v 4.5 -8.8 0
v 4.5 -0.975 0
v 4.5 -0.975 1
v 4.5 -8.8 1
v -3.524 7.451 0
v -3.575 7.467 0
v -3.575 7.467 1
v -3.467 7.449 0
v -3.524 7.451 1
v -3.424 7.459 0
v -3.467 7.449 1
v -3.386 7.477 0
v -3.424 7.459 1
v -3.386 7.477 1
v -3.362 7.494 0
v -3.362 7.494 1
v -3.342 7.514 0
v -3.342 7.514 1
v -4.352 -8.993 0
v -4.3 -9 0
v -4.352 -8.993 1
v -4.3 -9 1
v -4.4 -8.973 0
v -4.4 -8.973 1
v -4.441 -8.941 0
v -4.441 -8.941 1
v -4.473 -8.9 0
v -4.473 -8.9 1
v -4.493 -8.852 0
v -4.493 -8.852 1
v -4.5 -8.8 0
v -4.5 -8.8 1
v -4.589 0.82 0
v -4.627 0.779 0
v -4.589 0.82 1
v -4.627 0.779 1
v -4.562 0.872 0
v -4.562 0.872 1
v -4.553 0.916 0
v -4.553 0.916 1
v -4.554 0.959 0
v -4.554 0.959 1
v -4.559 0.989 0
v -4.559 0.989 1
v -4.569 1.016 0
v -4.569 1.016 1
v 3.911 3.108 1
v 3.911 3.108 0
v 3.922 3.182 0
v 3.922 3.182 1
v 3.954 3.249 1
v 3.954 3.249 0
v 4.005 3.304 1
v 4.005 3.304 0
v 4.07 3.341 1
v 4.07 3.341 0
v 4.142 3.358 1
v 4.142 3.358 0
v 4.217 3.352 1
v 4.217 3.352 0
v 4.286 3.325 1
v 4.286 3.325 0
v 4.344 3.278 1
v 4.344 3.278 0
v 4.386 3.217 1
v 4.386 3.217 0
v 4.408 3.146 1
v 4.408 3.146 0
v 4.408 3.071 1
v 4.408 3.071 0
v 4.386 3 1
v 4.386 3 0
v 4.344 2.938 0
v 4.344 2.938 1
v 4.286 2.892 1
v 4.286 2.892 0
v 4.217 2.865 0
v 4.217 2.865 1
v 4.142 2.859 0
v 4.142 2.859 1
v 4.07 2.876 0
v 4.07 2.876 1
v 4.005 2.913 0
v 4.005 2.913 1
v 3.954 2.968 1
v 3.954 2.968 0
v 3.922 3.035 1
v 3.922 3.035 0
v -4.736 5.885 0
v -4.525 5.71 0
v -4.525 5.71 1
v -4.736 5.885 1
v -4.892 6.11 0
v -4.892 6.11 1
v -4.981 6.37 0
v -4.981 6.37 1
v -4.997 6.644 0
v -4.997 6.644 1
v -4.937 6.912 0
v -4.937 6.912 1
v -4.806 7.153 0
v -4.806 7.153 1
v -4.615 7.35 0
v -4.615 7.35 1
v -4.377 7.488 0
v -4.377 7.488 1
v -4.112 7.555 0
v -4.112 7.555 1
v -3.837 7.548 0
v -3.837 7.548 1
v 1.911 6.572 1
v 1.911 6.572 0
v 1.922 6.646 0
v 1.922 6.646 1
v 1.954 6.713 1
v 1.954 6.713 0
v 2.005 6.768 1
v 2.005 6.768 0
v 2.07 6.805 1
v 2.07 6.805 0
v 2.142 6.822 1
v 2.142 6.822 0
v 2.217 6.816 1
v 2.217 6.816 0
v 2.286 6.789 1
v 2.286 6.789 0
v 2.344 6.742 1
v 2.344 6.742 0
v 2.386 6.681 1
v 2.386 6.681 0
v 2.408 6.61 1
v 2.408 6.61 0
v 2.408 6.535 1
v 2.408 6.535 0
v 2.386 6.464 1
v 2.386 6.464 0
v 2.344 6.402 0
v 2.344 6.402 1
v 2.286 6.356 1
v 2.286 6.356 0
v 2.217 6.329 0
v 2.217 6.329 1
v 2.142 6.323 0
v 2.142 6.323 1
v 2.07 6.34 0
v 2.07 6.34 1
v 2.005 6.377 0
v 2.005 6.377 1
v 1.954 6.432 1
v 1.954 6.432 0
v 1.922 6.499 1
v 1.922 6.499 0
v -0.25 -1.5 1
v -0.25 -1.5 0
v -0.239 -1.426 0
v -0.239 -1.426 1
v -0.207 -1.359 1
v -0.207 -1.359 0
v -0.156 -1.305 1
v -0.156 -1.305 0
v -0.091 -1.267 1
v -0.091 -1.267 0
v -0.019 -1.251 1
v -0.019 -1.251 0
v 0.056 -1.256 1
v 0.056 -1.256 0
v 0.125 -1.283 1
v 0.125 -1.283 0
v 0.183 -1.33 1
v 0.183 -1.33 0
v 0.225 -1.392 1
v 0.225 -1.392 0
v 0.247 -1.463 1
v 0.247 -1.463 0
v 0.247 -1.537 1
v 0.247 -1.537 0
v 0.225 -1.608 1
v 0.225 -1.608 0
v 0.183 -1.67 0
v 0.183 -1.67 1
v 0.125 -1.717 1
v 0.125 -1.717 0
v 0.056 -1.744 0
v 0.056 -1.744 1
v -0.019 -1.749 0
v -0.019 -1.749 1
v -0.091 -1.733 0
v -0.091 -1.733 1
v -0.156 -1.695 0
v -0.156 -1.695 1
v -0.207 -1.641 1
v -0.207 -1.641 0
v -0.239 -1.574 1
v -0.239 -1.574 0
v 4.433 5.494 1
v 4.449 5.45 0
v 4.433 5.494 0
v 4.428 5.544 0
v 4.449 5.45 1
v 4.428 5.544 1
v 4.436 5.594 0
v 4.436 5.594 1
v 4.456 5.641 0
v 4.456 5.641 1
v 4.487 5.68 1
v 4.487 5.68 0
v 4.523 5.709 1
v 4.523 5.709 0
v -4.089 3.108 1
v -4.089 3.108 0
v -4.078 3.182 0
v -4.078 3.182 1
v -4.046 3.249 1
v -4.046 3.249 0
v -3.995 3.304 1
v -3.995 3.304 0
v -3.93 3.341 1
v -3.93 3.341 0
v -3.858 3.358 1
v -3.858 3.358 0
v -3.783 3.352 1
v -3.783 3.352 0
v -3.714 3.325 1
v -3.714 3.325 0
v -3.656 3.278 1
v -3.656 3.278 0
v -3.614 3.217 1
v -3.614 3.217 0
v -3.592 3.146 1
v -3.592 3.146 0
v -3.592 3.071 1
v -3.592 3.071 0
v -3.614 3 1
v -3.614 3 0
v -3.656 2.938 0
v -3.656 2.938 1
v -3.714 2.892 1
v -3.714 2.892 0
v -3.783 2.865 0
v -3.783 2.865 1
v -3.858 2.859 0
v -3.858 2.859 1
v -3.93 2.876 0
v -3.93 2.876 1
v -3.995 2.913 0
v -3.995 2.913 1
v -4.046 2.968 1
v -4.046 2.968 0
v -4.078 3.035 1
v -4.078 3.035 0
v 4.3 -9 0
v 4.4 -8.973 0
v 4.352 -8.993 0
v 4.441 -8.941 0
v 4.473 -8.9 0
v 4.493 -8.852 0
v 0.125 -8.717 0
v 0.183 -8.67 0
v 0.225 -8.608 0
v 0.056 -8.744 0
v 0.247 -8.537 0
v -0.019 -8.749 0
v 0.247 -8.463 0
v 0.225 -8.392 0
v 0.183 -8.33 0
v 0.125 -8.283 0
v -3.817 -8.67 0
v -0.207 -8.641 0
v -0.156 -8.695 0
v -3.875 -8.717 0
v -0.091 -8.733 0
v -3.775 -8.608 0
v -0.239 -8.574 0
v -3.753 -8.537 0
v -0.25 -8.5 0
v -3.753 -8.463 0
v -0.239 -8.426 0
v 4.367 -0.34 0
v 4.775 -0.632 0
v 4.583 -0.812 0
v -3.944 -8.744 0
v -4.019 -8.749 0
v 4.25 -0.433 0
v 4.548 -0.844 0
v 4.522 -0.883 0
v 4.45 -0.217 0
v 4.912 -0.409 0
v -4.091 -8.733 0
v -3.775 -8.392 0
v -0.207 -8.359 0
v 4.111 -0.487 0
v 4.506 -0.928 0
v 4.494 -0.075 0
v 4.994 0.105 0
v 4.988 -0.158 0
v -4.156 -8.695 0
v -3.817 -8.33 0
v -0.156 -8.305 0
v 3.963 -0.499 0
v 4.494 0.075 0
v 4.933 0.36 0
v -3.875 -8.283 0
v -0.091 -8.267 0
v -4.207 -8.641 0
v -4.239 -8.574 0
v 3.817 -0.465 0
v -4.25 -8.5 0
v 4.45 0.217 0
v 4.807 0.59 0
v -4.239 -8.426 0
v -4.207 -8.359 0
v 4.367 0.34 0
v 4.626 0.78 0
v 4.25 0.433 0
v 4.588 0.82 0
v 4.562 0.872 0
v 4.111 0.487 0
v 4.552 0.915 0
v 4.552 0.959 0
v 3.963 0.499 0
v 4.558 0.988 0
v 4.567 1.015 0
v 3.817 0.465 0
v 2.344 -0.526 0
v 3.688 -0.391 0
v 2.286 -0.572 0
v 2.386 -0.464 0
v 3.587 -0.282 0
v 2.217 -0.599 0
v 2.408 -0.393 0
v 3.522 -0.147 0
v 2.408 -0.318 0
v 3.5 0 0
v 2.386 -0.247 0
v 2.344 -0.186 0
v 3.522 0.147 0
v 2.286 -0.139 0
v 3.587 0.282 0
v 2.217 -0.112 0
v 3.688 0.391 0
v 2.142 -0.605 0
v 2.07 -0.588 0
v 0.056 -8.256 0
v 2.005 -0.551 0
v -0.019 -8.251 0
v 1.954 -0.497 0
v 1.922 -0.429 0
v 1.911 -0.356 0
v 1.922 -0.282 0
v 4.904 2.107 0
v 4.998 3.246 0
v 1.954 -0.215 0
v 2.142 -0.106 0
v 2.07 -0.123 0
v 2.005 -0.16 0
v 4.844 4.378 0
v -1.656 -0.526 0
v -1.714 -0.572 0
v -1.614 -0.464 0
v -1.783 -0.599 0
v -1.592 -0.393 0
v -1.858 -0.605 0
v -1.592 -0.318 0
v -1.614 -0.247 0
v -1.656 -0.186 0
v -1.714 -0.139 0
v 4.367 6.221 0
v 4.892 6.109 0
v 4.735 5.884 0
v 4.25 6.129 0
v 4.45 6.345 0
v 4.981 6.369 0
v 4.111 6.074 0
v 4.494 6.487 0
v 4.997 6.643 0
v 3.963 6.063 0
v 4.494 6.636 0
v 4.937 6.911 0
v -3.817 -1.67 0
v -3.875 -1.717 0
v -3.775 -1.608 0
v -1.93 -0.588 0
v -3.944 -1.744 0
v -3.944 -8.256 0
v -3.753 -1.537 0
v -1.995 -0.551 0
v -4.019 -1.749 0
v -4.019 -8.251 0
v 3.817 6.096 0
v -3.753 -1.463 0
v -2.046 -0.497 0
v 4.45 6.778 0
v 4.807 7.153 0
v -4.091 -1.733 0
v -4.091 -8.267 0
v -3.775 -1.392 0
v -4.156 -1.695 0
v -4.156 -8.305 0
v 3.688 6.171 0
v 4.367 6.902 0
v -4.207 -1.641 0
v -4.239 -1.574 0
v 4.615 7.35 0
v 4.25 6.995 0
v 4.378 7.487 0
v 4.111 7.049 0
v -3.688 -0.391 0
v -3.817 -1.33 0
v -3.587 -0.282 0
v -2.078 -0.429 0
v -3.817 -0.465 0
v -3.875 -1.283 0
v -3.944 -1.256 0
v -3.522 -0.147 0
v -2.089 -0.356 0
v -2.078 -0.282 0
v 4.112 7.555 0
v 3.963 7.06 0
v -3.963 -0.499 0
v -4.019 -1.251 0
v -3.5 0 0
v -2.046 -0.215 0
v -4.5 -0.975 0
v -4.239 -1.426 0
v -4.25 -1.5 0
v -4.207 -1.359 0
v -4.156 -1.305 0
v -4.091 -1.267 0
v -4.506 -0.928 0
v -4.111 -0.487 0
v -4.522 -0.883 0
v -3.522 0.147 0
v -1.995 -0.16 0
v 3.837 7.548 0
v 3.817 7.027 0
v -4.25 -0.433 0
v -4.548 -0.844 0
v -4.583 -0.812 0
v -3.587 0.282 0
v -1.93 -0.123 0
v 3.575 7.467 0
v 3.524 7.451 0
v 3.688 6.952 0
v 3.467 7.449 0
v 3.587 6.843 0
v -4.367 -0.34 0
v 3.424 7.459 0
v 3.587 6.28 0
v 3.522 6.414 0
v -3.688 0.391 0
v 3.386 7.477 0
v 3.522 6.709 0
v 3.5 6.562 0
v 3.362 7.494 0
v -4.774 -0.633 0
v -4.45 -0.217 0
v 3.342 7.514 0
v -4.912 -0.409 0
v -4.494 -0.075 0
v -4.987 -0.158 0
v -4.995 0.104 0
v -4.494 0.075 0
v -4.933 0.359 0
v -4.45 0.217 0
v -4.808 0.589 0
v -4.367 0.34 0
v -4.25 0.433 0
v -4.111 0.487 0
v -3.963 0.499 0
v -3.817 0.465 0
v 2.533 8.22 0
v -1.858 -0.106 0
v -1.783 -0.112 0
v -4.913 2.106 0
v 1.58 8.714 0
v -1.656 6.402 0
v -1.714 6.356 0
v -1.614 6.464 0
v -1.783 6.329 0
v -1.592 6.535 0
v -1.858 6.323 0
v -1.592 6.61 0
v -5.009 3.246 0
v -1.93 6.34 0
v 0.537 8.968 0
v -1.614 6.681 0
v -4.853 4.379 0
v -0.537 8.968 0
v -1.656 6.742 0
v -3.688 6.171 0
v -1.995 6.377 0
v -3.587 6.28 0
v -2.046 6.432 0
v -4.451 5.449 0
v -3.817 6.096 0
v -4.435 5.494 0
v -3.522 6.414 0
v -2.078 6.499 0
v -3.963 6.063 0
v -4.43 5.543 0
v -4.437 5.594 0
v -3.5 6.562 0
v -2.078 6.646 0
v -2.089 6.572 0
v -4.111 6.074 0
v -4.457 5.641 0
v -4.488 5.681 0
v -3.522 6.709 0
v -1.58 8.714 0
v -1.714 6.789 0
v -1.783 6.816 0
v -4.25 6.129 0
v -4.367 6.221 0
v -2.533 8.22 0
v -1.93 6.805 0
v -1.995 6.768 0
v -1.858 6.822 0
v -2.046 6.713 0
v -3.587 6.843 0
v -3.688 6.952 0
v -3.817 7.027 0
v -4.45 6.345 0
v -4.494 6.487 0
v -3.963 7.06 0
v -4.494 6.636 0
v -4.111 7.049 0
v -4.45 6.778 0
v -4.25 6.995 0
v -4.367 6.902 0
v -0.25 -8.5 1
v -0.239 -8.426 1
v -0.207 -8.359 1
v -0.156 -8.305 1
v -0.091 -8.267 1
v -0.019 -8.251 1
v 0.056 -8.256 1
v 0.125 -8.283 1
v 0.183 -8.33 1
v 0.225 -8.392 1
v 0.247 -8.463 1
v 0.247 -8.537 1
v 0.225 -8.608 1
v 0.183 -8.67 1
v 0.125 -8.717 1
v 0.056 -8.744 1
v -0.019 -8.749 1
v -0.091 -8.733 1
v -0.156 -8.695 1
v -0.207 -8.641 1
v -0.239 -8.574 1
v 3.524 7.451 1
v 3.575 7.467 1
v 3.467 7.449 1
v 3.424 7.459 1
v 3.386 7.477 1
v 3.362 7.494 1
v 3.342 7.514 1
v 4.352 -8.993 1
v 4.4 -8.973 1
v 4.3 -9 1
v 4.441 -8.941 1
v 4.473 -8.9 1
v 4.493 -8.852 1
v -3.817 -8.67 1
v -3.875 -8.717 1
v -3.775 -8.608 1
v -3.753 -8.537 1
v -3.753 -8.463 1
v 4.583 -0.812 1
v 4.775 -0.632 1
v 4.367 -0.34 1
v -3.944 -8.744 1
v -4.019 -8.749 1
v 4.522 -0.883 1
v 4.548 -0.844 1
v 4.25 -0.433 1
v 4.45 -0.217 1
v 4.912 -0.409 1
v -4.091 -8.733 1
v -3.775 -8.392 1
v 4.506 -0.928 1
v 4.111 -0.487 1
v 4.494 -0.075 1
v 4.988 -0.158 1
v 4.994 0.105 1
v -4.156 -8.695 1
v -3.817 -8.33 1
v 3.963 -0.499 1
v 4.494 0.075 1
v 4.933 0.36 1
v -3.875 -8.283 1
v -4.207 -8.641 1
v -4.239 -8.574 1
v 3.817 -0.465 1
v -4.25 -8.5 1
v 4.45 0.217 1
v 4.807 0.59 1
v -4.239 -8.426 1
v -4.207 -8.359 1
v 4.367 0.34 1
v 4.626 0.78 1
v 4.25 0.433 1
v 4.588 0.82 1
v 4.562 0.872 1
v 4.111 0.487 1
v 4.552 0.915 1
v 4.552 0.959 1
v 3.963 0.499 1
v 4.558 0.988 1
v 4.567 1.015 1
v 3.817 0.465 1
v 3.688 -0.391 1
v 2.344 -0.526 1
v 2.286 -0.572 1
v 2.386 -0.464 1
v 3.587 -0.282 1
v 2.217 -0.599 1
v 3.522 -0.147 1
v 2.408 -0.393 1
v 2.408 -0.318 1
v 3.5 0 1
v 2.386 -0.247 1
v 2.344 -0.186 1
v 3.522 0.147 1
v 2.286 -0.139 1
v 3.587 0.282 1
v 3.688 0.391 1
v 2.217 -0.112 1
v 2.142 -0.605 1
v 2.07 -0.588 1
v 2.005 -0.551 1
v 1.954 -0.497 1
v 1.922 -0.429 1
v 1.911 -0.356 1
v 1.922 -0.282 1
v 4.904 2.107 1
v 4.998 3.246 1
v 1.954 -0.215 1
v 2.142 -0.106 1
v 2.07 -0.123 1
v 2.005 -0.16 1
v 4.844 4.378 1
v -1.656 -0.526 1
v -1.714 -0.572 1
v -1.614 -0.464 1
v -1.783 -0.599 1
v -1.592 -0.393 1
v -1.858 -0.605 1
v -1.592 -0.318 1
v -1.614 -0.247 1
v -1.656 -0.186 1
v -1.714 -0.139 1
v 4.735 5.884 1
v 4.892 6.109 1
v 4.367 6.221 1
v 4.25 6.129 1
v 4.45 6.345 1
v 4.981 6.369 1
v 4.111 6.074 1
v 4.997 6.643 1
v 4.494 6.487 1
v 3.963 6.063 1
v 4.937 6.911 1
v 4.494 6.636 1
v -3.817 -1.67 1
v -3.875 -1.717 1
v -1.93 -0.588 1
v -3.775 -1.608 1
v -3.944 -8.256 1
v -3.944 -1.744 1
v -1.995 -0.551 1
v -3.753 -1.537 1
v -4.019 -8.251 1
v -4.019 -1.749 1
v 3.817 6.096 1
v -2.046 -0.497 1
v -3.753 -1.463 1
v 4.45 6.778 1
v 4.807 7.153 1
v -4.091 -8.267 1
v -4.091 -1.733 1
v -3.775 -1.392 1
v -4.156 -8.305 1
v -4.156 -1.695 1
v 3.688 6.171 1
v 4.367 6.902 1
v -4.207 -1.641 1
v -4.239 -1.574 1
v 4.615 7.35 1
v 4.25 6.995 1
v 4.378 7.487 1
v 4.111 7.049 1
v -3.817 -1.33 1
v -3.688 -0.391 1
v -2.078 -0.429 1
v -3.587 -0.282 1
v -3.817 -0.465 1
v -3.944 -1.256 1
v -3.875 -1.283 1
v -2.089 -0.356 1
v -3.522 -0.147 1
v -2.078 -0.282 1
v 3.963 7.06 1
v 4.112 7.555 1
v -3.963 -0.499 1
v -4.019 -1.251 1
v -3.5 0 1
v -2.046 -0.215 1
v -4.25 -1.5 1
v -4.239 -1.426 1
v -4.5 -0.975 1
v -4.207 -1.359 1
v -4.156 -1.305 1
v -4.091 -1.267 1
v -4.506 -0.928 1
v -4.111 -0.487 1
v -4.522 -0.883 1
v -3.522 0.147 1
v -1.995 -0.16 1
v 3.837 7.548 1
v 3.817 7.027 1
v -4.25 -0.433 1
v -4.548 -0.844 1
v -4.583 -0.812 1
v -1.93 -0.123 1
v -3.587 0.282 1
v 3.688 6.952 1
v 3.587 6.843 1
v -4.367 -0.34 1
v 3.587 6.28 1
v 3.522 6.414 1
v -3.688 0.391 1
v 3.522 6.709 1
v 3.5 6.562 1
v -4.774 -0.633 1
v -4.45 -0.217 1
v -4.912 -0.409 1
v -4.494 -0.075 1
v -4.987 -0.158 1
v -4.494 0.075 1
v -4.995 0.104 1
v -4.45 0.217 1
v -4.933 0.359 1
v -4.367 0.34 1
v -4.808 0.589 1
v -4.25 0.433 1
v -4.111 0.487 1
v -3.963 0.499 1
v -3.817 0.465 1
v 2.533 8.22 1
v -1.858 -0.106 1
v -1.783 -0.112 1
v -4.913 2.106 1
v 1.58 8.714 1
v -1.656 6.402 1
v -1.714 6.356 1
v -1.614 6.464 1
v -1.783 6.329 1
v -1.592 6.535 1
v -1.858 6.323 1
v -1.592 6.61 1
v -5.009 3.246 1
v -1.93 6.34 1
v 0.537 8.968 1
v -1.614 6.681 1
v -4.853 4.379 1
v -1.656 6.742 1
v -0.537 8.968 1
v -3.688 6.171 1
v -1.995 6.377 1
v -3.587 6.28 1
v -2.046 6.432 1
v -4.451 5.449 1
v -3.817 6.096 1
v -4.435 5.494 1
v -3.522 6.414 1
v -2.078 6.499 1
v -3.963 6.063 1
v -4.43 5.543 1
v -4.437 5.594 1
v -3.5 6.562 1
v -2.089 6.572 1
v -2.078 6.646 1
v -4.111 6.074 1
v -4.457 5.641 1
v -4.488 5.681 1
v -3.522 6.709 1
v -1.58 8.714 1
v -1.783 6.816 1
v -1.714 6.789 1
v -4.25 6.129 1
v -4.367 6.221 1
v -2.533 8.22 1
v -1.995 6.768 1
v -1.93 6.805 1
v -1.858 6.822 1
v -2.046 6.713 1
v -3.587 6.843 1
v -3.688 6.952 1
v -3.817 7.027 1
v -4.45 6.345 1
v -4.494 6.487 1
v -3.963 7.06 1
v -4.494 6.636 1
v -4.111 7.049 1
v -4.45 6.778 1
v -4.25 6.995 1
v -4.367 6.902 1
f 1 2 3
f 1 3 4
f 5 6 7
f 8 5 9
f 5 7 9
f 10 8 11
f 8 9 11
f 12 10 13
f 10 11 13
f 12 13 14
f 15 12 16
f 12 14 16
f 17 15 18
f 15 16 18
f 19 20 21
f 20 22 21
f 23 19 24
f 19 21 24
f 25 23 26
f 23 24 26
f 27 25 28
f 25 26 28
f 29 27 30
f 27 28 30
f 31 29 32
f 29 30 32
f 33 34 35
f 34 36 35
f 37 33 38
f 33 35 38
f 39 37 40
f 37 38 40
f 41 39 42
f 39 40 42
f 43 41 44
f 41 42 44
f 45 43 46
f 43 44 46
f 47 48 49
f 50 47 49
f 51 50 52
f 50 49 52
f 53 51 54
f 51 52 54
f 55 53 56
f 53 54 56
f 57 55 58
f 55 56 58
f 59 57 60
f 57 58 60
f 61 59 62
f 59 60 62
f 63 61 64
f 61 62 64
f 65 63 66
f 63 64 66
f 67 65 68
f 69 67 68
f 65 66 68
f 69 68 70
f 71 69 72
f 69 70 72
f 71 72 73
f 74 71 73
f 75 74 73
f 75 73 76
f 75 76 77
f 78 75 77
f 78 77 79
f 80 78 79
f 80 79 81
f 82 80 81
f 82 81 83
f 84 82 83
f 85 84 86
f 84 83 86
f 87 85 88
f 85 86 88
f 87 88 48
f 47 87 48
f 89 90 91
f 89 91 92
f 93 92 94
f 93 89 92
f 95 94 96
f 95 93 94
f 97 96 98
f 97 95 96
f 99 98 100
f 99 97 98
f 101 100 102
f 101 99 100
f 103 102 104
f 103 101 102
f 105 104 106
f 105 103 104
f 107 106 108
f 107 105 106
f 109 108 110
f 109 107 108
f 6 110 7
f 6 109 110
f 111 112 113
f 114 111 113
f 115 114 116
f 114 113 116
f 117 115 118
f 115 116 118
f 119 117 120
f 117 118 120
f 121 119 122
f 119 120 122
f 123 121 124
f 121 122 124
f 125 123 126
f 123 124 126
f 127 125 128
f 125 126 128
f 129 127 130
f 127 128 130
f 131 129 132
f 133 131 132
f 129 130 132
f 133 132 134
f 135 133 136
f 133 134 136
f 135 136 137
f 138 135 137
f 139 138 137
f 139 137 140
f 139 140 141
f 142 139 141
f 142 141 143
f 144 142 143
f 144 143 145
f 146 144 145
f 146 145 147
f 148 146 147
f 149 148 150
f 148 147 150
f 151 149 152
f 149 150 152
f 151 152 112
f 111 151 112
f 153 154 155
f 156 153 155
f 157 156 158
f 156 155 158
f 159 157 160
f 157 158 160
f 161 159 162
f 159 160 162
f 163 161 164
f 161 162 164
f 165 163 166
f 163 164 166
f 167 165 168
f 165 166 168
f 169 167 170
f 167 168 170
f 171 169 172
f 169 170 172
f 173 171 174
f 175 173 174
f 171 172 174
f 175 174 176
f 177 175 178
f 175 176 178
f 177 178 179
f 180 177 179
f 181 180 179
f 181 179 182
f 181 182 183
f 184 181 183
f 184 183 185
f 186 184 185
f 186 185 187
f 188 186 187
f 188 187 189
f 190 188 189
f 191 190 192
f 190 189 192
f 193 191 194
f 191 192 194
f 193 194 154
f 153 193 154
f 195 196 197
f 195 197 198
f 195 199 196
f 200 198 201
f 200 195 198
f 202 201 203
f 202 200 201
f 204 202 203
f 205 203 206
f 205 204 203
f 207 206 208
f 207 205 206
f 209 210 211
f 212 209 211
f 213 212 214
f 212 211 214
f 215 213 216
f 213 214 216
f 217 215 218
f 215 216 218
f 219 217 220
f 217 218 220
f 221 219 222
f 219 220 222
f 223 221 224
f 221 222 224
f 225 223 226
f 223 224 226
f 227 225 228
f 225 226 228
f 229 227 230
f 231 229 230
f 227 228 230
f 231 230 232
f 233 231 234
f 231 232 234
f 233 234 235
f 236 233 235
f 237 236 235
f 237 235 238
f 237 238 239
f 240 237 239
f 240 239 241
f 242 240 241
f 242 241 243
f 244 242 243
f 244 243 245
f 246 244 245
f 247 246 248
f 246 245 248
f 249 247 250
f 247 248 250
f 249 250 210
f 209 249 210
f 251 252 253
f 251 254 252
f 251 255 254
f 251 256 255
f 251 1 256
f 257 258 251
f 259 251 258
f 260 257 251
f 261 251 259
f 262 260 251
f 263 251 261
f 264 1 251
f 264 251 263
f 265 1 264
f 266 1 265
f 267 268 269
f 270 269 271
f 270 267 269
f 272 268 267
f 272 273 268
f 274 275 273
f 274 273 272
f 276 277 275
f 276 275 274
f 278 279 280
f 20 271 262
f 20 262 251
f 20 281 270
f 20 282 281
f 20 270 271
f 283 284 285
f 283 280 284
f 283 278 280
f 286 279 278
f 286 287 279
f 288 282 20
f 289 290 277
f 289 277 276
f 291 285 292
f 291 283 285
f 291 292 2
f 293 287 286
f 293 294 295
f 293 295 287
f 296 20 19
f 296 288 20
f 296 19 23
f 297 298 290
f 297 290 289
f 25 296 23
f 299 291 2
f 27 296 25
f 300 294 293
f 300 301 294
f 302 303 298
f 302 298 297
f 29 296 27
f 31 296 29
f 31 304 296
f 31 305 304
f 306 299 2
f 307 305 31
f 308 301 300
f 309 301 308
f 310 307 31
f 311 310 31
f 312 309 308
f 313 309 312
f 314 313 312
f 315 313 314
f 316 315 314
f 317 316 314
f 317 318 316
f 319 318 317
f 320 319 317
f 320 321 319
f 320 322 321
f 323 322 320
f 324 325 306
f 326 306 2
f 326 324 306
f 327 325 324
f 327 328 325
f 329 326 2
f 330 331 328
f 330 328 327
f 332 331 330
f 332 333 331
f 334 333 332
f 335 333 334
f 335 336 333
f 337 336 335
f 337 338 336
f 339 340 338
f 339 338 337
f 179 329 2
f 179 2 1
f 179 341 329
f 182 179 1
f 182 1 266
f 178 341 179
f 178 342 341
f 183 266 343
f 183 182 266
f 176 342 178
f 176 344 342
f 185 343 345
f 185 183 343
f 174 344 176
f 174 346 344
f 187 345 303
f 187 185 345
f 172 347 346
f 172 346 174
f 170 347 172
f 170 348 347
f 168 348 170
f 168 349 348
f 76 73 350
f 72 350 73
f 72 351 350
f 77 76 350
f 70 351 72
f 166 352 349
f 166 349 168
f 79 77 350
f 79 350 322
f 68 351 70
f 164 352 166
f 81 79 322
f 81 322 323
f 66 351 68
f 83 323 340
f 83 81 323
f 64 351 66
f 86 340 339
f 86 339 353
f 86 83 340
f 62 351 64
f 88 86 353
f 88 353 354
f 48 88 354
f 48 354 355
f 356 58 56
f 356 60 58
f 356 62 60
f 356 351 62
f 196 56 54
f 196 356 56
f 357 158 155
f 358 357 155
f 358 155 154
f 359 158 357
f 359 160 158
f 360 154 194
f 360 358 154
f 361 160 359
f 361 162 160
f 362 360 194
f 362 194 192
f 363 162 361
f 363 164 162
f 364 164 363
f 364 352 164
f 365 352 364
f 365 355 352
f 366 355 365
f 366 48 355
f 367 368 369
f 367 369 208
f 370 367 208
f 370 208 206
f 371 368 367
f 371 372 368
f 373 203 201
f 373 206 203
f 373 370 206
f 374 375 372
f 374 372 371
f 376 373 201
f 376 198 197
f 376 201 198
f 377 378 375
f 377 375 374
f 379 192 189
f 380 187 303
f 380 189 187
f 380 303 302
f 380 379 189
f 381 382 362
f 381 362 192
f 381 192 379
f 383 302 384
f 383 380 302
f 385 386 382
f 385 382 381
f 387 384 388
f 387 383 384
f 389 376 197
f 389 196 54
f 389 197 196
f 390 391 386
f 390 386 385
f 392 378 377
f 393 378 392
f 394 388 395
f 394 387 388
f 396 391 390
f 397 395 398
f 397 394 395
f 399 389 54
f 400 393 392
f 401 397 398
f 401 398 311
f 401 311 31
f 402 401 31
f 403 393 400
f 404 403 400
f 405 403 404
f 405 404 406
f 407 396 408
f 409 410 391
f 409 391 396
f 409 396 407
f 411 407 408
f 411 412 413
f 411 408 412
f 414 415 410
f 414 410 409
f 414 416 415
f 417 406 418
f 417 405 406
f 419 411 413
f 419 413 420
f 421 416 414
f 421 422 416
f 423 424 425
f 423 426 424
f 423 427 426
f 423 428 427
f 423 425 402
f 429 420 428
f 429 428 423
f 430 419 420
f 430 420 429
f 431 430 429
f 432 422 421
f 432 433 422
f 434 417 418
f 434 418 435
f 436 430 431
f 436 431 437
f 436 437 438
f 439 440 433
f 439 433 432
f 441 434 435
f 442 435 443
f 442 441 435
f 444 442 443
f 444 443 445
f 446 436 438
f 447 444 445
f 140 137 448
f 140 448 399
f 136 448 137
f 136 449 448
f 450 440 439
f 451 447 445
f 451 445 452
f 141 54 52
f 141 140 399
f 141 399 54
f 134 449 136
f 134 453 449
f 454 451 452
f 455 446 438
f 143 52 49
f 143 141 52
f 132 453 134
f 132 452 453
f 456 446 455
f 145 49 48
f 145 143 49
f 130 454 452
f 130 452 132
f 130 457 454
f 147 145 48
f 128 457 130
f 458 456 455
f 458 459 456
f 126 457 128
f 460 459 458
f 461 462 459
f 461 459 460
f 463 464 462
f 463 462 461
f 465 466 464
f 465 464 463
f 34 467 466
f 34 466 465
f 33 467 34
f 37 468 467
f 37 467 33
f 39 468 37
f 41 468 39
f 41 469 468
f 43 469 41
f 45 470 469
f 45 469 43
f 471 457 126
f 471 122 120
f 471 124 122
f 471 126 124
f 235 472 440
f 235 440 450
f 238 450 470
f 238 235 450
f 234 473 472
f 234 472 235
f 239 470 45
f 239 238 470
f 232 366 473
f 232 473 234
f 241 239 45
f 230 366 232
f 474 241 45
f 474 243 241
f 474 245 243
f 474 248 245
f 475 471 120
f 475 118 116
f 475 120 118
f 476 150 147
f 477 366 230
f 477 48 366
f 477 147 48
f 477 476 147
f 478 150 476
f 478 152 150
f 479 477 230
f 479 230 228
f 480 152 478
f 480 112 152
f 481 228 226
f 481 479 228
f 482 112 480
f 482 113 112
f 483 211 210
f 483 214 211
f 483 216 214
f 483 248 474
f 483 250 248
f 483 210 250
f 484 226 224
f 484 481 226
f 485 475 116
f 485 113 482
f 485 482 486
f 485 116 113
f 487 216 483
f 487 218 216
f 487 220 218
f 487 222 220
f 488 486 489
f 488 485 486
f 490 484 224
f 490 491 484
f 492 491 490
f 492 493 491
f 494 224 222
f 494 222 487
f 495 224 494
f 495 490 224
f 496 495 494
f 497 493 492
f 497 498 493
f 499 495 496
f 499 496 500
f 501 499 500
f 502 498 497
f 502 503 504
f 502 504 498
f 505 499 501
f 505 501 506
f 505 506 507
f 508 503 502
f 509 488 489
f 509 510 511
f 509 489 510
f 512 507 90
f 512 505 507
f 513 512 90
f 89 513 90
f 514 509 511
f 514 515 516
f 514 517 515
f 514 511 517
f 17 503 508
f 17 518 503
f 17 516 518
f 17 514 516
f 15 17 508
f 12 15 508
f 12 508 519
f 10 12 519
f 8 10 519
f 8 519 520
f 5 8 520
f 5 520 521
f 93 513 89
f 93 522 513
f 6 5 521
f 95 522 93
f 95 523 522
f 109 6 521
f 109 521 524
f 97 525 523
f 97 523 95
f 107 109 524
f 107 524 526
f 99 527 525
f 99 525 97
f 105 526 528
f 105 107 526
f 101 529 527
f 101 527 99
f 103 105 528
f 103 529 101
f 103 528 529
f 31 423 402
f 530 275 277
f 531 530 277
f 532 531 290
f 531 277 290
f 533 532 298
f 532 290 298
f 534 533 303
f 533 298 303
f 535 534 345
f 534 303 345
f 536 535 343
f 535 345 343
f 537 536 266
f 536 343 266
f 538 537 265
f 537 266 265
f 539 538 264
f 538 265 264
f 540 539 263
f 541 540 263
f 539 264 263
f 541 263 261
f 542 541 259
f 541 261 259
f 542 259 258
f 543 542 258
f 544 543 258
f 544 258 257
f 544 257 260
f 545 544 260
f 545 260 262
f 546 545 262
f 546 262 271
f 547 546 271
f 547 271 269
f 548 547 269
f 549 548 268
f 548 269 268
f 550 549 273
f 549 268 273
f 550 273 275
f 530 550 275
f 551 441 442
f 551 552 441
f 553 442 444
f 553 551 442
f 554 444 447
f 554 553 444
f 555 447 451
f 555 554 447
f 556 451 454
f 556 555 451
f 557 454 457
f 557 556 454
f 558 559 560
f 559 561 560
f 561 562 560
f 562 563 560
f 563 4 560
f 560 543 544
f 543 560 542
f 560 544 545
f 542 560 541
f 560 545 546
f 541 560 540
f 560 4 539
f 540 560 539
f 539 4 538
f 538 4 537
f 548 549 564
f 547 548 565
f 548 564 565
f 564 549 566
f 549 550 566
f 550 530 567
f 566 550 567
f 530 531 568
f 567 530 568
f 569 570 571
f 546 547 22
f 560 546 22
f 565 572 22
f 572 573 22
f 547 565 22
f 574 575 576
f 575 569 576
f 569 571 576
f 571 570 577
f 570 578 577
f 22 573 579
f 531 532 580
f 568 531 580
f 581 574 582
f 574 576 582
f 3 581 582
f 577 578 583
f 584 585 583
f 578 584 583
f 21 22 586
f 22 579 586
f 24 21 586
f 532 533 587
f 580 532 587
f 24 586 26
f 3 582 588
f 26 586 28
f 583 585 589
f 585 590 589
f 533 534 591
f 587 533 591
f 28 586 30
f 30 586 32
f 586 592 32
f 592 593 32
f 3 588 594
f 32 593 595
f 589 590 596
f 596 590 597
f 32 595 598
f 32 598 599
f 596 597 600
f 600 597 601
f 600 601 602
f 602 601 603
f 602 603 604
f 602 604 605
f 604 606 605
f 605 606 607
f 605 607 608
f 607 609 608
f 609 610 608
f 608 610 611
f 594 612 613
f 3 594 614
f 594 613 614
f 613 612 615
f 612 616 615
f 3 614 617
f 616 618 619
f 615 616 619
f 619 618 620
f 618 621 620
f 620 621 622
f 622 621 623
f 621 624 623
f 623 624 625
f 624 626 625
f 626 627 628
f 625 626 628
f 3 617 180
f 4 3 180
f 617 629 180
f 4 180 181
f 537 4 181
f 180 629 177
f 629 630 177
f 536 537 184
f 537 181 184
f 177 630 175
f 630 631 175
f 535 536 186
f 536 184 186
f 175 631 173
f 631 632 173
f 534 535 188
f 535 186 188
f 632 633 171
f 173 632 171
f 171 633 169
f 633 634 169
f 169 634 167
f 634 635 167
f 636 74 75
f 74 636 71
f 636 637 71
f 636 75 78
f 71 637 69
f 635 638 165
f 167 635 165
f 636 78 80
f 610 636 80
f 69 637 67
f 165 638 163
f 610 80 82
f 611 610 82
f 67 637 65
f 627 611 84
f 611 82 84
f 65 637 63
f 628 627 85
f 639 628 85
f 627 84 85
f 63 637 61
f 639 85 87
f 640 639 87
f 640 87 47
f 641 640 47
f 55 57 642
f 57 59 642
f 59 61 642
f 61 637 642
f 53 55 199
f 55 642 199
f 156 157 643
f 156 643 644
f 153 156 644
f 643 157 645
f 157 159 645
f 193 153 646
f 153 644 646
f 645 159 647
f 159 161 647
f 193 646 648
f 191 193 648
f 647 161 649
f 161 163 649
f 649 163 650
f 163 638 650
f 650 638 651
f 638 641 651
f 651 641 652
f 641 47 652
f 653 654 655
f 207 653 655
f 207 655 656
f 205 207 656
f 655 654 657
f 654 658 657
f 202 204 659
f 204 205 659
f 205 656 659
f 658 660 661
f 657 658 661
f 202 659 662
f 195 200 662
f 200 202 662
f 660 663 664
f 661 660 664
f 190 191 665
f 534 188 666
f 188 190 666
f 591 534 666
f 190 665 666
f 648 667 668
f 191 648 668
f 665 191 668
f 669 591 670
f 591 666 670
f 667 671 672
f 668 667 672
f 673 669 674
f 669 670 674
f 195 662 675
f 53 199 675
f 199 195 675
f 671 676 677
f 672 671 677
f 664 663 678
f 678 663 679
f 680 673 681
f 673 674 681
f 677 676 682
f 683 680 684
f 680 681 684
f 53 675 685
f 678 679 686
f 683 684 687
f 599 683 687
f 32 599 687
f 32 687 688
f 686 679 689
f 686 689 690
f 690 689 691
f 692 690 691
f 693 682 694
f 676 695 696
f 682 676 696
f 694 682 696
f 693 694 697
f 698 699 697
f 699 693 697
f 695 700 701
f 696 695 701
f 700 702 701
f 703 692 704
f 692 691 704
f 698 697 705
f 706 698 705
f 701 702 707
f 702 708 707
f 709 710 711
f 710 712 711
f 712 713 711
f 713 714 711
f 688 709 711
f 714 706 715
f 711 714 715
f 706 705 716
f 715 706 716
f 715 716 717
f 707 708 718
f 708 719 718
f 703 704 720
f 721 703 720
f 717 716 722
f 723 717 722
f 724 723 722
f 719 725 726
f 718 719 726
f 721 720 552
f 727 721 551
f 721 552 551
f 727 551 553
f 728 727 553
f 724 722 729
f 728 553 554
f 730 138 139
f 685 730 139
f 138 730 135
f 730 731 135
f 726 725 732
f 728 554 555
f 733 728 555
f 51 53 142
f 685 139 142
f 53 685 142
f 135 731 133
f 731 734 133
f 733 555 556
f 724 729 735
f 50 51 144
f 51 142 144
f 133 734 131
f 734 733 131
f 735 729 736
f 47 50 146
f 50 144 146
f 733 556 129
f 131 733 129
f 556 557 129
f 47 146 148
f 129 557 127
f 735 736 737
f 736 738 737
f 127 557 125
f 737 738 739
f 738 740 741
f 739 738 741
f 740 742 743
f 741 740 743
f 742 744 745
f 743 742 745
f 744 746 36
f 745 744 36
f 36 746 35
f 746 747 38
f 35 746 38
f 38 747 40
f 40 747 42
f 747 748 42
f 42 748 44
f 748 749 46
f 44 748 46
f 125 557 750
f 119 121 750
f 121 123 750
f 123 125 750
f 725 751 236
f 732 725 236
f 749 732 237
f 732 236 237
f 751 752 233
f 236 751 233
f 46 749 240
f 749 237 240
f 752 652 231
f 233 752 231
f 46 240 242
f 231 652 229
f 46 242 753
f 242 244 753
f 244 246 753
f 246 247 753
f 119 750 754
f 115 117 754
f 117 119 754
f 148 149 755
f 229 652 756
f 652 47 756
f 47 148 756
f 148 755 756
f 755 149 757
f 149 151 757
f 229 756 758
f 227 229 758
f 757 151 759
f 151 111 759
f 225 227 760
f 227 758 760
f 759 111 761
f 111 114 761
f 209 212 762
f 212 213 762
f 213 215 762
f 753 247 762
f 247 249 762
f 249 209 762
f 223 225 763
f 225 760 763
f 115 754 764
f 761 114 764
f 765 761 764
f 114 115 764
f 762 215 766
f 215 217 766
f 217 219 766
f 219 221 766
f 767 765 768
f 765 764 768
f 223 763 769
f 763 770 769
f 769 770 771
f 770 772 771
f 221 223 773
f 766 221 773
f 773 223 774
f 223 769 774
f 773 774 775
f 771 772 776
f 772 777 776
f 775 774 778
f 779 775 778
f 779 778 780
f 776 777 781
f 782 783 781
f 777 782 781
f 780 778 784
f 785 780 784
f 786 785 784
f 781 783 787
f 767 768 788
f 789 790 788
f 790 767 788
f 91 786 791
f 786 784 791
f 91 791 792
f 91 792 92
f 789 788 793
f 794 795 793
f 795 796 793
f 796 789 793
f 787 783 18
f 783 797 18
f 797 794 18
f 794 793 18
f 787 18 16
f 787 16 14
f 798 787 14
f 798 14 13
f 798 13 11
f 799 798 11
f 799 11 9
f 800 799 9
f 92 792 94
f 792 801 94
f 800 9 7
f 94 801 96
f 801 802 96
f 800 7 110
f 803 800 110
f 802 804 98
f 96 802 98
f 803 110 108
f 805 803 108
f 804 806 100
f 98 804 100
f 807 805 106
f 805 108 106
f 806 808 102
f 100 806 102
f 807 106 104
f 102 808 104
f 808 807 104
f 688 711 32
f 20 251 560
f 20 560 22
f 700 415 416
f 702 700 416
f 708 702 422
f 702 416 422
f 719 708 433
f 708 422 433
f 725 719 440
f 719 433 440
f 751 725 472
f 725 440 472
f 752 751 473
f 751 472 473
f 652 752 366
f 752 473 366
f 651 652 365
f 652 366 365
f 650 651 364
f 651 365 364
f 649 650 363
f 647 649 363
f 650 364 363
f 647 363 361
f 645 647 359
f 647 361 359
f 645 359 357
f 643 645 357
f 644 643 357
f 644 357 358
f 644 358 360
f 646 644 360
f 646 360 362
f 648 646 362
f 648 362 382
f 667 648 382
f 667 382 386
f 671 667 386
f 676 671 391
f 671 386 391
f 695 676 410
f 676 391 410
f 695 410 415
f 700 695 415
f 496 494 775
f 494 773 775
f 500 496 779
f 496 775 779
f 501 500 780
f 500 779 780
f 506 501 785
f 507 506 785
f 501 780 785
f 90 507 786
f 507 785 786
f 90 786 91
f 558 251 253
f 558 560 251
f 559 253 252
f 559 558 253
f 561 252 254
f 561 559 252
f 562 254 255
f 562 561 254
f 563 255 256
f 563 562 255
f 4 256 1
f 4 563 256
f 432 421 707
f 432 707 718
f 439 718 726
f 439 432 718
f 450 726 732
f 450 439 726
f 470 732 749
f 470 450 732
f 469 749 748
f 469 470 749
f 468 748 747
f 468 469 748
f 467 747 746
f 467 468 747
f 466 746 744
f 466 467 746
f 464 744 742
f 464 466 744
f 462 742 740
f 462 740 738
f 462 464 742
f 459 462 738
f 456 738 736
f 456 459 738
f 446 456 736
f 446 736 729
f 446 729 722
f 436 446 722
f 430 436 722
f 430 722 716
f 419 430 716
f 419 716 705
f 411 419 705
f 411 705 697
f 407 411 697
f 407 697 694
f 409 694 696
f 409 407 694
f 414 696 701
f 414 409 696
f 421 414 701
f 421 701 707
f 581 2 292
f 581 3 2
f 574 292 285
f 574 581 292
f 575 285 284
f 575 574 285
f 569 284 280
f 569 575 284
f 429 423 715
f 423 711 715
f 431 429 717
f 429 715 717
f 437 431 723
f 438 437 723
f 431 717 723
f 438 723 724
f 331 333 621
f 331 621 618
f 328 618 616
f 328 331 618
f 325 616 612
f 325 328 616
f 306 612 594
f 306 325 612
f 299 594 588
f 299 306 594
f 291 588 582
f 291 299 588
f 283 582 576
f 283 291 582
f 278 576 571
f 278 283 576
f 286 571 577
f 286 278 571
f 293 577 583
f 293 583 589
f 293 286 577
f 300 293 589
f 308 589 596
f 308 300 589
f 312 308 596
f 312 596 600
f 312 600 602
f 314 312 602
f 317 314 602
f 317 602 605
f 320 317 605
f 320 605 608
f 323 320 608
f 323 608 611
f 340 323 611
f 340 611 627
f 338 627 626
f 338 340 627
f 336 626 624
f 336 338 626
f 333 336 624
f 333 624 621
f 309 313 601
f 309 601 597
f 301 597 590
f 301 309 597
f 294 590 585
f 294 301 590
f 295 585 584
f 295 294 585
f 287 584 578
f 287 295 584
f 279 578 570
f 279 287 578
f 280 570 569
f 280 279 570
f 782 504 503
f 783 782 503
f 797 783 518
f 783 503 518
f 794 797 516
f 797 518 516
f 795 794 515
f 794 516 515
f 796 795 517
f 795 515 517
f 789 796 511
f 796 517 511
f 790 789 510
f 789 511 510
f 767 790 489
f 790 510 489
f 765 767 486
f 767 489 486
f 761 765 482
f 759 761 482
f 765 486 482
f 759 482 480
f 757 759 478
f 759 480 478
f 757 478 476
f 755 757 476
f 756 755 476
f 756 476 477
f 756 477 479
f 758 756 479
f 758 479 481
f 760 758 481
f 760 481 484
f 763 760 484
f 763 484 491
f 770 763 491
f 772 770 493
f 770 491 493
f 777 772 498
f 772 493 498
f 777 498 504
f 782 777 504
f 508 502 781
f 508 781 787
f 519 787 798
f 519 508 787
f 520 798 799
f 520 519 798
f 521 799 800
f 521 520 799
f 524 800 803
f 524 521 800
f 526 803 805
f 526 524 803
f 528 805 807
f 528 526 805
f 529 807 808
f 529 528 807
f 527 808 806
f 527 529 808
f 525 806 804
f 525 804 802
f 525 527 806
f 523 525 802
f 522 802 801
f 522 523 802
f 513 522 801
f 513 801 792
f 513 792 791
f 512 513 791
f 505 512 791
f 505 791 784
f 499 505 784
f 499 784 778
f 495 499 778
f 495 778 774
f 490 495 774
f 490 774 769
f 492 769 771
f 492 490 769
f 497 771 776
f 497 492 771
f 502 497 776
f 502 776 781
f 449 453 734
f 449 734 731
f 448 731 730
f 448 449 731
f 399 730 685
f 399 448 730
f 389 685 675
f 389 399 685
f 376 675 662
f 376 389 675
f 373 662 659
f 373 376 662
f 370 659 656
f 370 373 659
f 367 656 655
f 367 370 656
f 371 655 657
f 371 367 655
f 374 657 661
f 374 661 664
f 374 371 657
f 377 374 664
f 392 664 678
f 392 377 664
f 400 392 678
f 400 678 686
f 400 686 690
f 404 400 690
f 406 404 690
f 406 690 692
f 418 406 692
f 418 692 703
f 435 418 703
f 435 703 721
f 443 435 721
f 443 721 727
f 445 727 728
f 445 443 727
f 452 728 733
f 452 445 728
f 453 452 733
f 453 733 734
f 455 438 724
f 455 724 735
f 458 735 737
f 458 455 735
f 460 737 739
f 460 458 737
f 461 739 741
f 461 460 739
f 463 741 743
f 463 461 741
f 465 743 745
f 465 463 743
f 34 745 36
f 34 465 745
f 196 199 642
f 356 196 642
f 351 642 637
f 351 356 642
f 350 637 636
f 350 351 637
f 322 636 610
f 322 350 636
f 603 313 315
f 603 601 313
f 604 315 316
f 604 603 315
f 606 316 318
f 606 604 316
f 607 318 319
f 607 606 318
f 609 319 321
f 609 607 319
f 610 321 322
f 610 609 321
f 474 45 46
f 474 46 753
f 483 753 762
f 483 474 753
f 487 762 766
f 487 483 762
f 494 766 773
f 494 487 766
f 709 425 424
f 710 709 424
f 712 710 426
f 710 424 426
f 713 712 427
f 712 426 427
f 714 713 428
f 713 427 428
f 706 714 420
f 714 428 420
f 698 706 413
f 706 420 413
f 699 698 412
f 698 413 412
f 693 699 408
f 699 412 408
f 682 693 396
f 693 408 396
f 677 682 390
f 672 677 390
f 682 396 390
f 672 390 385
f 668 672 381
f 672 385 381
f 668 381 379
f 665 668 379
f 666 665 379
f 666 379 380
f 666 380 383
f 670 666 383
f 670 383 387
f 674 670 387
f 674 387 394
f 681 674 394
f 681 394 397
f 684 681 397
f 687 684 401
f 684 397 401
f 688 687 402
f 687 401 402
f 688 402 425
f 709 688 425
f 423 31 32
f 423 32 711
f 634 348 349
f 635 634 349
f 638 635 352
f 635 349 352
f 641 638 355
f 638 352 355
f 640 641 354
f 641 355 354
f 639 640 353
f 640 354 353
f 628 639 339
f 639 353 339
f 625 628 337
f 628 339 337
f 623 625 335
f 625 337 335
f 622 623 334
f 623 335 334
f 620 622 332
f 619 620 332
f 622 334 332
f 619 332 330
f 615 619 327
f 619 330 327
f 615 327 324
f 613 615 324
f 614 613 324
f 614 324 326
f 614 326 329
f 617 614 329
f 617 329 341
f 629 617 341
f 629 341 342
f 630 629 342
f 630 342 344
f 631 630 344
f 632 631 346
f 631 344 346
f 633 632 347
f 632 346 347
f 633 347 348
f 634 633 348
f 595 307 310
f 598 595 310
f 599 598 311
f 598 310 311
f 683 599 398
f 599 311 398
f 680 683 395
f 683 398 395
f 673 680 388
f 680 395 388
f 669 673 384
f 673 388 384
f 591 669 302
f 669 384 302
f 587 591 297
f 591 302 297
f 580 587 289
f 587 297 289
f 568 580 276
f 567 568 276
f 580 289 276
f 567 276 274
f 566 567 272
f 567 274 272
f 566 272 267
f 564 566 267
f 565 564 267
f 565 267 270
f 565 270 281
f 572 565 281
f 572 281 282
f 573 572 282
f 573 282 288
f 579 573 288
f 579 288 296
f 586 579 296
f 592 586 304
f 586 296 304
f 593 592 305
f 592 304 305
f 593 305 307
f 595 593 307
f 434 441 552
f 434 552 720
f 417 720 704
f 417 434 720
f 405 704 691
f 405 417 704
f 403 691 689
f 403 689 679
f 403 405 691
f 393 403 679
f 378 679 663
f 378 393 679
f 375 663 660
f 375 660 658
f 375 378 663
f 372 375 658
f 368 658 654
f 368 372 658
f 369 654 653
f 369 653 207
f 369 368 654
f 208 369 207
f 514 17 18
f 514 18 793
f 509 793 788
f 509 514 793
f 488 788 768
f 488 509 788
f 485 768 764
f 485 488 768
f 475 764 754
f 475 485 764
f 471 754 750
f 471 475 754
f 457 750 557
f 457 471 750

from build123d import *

# Parameters (mm, degrees)
SKETCH1_R           = 0.5
BOSS_EXTRUDE2_DEPTH = 1
FILLET2_R           = 0.2
SKETCH3_R           = 0.25
CUT_EXTRUDE1_DEPTH  = 1
SKETCH4_R           = 0.25
CUT_EXTRUDE2_DEPTH  = 1


with BuildPart() as part:
    # Sketch1 → Boss-Extrude2 (new body)
    with BuildSketch(Plane.XY):
        with BuildLine():
            Line((4.5, -9), (0, -9))
            Line((0, -9), (-4.5, -9))
            Line((-4.5, -9), (-4.5, -0.866025404))
            ThreePointArc((-4.5, -0.866025404), (-5, 0), (-4.5, 0.866025404))
            ThreePointArc((-4.5, 0.866025404), (-5.008977866, 3.264145238), (-4.356520714, 5.627265394))
            ThreePointArc((-4.356520714, 5.627265394), (-4.888888889, 7.01967566), (-3.445948422, 7.394035154))
            ThreePointArc((-3.445948422, 7.394035154), (0, 9), (3.445948422, 7.394035154))
            ThreePointArc((3.445948422, 7.394035154), (4.888888889, 7.01967566), (4.356520714, 5.627265394))
            ThreePointArc((4.356520714, 5.627265394), (4.997611441, 3.263802712), (4.5, 0.866025404))
            ThreePointArc((4.5, 0.866025404), (5, 0), (4.5, -0.866025404))
            Line((4.5, -0.866025404), (4.5, -9))
        make_face()
        with Locations((-4, 0)):
            Circle(SKETCH1_R, mode=Mode.SUBTRACT)
        with Locations((-4, 6.561552813)):
            Circle(SKETCH1_R, mode=Mode.SUBTRACT)
        with Locations(Location((4, 6.561552813, 0), (0, 0, 180))):
            Circle(SKETCH1_R, mode=Mode.SUBTRACT)
        with Locations(Location((4, 0, 0), (0, 0, 180))):
            Circle(SKETCH1_R, mode=Mode.SUBTRACT)
    extrude(amount=BOSS_EXTRUDE2_DEPTH)

    # Fillet2
    fillet2_edges = [part.edges().sort_by_distance(p)[0] for p in [
        (-4.5, -9, 0.5),
        (-4.5, -0.866025404, 0.5),
        (-4.5, 0.866025404, 0.5),
        (-4.356520714, 5.627265394, 0.5),
        (-3.445948422, 7.394035154, 0.5),
        (3.445948422, 7.394035154, 0.5),
        (4.356520714, 5.627265394, 0.5),
        (4.5, 0.866025404, 0.5),
        (4.5, -0.866025404, 0.5),
        (4.5, -9, 0.5),
    ]]
    fillet(fillet2_edges, radius=FILLET2_R)

    # Sketch3 → Cut-Extrude1 (cut)
    with BuildSketch(Plane(origin=(0, 0, 0), x_dir=(-1, 0, 0), z_dir=(0, 0, -1))):
        with Locations((3.839007705, 3.108348927)):
            Circle(SKETCH3_R)
        with Locations((1.839007705, -0.355752688)):
            Circle(SKETCH3_R)
        with Locations((-2.160992295, -0.355752688)):
            Circle(SKETCH3_R)
        with Locations((-4.160992295, 3.108348927)):
            Circle(SKETCH3_R)
        with Locations((-2.160992295, 6.572450542)):
            Circle(SKETCH3_R)
        with Locations((1.839007705, 6.572450542)):
            Circle(SKETCH3_R)
    extrude(amount=-CUT_EXTRUDE1_DEPTH, mode=Mode.SUBTRACT)

    # Sketch4 → Cut-Extrude2 (cut)
    with BuildSketch(Plane(origin=(0, 0, 0), x_dir=(-1, 0, 0), z_dir=(0, 0, -1))):
        with Locations((4, -1.5)):
            Circle(SKETCH4_R)
        with Locations((4, -8.5)):
            Circle(SKETCH4_R)
        with Locations((0, -1.5)):
            Circle(SKETCH4_R)
        with Locations((0, -8.5)):
            Circle(SKETCH4_R)
    extrude(amount=-CUT_EXTRUDE2_DEPTH, mode=Mode.SUBTRACT)


solid = part.part
